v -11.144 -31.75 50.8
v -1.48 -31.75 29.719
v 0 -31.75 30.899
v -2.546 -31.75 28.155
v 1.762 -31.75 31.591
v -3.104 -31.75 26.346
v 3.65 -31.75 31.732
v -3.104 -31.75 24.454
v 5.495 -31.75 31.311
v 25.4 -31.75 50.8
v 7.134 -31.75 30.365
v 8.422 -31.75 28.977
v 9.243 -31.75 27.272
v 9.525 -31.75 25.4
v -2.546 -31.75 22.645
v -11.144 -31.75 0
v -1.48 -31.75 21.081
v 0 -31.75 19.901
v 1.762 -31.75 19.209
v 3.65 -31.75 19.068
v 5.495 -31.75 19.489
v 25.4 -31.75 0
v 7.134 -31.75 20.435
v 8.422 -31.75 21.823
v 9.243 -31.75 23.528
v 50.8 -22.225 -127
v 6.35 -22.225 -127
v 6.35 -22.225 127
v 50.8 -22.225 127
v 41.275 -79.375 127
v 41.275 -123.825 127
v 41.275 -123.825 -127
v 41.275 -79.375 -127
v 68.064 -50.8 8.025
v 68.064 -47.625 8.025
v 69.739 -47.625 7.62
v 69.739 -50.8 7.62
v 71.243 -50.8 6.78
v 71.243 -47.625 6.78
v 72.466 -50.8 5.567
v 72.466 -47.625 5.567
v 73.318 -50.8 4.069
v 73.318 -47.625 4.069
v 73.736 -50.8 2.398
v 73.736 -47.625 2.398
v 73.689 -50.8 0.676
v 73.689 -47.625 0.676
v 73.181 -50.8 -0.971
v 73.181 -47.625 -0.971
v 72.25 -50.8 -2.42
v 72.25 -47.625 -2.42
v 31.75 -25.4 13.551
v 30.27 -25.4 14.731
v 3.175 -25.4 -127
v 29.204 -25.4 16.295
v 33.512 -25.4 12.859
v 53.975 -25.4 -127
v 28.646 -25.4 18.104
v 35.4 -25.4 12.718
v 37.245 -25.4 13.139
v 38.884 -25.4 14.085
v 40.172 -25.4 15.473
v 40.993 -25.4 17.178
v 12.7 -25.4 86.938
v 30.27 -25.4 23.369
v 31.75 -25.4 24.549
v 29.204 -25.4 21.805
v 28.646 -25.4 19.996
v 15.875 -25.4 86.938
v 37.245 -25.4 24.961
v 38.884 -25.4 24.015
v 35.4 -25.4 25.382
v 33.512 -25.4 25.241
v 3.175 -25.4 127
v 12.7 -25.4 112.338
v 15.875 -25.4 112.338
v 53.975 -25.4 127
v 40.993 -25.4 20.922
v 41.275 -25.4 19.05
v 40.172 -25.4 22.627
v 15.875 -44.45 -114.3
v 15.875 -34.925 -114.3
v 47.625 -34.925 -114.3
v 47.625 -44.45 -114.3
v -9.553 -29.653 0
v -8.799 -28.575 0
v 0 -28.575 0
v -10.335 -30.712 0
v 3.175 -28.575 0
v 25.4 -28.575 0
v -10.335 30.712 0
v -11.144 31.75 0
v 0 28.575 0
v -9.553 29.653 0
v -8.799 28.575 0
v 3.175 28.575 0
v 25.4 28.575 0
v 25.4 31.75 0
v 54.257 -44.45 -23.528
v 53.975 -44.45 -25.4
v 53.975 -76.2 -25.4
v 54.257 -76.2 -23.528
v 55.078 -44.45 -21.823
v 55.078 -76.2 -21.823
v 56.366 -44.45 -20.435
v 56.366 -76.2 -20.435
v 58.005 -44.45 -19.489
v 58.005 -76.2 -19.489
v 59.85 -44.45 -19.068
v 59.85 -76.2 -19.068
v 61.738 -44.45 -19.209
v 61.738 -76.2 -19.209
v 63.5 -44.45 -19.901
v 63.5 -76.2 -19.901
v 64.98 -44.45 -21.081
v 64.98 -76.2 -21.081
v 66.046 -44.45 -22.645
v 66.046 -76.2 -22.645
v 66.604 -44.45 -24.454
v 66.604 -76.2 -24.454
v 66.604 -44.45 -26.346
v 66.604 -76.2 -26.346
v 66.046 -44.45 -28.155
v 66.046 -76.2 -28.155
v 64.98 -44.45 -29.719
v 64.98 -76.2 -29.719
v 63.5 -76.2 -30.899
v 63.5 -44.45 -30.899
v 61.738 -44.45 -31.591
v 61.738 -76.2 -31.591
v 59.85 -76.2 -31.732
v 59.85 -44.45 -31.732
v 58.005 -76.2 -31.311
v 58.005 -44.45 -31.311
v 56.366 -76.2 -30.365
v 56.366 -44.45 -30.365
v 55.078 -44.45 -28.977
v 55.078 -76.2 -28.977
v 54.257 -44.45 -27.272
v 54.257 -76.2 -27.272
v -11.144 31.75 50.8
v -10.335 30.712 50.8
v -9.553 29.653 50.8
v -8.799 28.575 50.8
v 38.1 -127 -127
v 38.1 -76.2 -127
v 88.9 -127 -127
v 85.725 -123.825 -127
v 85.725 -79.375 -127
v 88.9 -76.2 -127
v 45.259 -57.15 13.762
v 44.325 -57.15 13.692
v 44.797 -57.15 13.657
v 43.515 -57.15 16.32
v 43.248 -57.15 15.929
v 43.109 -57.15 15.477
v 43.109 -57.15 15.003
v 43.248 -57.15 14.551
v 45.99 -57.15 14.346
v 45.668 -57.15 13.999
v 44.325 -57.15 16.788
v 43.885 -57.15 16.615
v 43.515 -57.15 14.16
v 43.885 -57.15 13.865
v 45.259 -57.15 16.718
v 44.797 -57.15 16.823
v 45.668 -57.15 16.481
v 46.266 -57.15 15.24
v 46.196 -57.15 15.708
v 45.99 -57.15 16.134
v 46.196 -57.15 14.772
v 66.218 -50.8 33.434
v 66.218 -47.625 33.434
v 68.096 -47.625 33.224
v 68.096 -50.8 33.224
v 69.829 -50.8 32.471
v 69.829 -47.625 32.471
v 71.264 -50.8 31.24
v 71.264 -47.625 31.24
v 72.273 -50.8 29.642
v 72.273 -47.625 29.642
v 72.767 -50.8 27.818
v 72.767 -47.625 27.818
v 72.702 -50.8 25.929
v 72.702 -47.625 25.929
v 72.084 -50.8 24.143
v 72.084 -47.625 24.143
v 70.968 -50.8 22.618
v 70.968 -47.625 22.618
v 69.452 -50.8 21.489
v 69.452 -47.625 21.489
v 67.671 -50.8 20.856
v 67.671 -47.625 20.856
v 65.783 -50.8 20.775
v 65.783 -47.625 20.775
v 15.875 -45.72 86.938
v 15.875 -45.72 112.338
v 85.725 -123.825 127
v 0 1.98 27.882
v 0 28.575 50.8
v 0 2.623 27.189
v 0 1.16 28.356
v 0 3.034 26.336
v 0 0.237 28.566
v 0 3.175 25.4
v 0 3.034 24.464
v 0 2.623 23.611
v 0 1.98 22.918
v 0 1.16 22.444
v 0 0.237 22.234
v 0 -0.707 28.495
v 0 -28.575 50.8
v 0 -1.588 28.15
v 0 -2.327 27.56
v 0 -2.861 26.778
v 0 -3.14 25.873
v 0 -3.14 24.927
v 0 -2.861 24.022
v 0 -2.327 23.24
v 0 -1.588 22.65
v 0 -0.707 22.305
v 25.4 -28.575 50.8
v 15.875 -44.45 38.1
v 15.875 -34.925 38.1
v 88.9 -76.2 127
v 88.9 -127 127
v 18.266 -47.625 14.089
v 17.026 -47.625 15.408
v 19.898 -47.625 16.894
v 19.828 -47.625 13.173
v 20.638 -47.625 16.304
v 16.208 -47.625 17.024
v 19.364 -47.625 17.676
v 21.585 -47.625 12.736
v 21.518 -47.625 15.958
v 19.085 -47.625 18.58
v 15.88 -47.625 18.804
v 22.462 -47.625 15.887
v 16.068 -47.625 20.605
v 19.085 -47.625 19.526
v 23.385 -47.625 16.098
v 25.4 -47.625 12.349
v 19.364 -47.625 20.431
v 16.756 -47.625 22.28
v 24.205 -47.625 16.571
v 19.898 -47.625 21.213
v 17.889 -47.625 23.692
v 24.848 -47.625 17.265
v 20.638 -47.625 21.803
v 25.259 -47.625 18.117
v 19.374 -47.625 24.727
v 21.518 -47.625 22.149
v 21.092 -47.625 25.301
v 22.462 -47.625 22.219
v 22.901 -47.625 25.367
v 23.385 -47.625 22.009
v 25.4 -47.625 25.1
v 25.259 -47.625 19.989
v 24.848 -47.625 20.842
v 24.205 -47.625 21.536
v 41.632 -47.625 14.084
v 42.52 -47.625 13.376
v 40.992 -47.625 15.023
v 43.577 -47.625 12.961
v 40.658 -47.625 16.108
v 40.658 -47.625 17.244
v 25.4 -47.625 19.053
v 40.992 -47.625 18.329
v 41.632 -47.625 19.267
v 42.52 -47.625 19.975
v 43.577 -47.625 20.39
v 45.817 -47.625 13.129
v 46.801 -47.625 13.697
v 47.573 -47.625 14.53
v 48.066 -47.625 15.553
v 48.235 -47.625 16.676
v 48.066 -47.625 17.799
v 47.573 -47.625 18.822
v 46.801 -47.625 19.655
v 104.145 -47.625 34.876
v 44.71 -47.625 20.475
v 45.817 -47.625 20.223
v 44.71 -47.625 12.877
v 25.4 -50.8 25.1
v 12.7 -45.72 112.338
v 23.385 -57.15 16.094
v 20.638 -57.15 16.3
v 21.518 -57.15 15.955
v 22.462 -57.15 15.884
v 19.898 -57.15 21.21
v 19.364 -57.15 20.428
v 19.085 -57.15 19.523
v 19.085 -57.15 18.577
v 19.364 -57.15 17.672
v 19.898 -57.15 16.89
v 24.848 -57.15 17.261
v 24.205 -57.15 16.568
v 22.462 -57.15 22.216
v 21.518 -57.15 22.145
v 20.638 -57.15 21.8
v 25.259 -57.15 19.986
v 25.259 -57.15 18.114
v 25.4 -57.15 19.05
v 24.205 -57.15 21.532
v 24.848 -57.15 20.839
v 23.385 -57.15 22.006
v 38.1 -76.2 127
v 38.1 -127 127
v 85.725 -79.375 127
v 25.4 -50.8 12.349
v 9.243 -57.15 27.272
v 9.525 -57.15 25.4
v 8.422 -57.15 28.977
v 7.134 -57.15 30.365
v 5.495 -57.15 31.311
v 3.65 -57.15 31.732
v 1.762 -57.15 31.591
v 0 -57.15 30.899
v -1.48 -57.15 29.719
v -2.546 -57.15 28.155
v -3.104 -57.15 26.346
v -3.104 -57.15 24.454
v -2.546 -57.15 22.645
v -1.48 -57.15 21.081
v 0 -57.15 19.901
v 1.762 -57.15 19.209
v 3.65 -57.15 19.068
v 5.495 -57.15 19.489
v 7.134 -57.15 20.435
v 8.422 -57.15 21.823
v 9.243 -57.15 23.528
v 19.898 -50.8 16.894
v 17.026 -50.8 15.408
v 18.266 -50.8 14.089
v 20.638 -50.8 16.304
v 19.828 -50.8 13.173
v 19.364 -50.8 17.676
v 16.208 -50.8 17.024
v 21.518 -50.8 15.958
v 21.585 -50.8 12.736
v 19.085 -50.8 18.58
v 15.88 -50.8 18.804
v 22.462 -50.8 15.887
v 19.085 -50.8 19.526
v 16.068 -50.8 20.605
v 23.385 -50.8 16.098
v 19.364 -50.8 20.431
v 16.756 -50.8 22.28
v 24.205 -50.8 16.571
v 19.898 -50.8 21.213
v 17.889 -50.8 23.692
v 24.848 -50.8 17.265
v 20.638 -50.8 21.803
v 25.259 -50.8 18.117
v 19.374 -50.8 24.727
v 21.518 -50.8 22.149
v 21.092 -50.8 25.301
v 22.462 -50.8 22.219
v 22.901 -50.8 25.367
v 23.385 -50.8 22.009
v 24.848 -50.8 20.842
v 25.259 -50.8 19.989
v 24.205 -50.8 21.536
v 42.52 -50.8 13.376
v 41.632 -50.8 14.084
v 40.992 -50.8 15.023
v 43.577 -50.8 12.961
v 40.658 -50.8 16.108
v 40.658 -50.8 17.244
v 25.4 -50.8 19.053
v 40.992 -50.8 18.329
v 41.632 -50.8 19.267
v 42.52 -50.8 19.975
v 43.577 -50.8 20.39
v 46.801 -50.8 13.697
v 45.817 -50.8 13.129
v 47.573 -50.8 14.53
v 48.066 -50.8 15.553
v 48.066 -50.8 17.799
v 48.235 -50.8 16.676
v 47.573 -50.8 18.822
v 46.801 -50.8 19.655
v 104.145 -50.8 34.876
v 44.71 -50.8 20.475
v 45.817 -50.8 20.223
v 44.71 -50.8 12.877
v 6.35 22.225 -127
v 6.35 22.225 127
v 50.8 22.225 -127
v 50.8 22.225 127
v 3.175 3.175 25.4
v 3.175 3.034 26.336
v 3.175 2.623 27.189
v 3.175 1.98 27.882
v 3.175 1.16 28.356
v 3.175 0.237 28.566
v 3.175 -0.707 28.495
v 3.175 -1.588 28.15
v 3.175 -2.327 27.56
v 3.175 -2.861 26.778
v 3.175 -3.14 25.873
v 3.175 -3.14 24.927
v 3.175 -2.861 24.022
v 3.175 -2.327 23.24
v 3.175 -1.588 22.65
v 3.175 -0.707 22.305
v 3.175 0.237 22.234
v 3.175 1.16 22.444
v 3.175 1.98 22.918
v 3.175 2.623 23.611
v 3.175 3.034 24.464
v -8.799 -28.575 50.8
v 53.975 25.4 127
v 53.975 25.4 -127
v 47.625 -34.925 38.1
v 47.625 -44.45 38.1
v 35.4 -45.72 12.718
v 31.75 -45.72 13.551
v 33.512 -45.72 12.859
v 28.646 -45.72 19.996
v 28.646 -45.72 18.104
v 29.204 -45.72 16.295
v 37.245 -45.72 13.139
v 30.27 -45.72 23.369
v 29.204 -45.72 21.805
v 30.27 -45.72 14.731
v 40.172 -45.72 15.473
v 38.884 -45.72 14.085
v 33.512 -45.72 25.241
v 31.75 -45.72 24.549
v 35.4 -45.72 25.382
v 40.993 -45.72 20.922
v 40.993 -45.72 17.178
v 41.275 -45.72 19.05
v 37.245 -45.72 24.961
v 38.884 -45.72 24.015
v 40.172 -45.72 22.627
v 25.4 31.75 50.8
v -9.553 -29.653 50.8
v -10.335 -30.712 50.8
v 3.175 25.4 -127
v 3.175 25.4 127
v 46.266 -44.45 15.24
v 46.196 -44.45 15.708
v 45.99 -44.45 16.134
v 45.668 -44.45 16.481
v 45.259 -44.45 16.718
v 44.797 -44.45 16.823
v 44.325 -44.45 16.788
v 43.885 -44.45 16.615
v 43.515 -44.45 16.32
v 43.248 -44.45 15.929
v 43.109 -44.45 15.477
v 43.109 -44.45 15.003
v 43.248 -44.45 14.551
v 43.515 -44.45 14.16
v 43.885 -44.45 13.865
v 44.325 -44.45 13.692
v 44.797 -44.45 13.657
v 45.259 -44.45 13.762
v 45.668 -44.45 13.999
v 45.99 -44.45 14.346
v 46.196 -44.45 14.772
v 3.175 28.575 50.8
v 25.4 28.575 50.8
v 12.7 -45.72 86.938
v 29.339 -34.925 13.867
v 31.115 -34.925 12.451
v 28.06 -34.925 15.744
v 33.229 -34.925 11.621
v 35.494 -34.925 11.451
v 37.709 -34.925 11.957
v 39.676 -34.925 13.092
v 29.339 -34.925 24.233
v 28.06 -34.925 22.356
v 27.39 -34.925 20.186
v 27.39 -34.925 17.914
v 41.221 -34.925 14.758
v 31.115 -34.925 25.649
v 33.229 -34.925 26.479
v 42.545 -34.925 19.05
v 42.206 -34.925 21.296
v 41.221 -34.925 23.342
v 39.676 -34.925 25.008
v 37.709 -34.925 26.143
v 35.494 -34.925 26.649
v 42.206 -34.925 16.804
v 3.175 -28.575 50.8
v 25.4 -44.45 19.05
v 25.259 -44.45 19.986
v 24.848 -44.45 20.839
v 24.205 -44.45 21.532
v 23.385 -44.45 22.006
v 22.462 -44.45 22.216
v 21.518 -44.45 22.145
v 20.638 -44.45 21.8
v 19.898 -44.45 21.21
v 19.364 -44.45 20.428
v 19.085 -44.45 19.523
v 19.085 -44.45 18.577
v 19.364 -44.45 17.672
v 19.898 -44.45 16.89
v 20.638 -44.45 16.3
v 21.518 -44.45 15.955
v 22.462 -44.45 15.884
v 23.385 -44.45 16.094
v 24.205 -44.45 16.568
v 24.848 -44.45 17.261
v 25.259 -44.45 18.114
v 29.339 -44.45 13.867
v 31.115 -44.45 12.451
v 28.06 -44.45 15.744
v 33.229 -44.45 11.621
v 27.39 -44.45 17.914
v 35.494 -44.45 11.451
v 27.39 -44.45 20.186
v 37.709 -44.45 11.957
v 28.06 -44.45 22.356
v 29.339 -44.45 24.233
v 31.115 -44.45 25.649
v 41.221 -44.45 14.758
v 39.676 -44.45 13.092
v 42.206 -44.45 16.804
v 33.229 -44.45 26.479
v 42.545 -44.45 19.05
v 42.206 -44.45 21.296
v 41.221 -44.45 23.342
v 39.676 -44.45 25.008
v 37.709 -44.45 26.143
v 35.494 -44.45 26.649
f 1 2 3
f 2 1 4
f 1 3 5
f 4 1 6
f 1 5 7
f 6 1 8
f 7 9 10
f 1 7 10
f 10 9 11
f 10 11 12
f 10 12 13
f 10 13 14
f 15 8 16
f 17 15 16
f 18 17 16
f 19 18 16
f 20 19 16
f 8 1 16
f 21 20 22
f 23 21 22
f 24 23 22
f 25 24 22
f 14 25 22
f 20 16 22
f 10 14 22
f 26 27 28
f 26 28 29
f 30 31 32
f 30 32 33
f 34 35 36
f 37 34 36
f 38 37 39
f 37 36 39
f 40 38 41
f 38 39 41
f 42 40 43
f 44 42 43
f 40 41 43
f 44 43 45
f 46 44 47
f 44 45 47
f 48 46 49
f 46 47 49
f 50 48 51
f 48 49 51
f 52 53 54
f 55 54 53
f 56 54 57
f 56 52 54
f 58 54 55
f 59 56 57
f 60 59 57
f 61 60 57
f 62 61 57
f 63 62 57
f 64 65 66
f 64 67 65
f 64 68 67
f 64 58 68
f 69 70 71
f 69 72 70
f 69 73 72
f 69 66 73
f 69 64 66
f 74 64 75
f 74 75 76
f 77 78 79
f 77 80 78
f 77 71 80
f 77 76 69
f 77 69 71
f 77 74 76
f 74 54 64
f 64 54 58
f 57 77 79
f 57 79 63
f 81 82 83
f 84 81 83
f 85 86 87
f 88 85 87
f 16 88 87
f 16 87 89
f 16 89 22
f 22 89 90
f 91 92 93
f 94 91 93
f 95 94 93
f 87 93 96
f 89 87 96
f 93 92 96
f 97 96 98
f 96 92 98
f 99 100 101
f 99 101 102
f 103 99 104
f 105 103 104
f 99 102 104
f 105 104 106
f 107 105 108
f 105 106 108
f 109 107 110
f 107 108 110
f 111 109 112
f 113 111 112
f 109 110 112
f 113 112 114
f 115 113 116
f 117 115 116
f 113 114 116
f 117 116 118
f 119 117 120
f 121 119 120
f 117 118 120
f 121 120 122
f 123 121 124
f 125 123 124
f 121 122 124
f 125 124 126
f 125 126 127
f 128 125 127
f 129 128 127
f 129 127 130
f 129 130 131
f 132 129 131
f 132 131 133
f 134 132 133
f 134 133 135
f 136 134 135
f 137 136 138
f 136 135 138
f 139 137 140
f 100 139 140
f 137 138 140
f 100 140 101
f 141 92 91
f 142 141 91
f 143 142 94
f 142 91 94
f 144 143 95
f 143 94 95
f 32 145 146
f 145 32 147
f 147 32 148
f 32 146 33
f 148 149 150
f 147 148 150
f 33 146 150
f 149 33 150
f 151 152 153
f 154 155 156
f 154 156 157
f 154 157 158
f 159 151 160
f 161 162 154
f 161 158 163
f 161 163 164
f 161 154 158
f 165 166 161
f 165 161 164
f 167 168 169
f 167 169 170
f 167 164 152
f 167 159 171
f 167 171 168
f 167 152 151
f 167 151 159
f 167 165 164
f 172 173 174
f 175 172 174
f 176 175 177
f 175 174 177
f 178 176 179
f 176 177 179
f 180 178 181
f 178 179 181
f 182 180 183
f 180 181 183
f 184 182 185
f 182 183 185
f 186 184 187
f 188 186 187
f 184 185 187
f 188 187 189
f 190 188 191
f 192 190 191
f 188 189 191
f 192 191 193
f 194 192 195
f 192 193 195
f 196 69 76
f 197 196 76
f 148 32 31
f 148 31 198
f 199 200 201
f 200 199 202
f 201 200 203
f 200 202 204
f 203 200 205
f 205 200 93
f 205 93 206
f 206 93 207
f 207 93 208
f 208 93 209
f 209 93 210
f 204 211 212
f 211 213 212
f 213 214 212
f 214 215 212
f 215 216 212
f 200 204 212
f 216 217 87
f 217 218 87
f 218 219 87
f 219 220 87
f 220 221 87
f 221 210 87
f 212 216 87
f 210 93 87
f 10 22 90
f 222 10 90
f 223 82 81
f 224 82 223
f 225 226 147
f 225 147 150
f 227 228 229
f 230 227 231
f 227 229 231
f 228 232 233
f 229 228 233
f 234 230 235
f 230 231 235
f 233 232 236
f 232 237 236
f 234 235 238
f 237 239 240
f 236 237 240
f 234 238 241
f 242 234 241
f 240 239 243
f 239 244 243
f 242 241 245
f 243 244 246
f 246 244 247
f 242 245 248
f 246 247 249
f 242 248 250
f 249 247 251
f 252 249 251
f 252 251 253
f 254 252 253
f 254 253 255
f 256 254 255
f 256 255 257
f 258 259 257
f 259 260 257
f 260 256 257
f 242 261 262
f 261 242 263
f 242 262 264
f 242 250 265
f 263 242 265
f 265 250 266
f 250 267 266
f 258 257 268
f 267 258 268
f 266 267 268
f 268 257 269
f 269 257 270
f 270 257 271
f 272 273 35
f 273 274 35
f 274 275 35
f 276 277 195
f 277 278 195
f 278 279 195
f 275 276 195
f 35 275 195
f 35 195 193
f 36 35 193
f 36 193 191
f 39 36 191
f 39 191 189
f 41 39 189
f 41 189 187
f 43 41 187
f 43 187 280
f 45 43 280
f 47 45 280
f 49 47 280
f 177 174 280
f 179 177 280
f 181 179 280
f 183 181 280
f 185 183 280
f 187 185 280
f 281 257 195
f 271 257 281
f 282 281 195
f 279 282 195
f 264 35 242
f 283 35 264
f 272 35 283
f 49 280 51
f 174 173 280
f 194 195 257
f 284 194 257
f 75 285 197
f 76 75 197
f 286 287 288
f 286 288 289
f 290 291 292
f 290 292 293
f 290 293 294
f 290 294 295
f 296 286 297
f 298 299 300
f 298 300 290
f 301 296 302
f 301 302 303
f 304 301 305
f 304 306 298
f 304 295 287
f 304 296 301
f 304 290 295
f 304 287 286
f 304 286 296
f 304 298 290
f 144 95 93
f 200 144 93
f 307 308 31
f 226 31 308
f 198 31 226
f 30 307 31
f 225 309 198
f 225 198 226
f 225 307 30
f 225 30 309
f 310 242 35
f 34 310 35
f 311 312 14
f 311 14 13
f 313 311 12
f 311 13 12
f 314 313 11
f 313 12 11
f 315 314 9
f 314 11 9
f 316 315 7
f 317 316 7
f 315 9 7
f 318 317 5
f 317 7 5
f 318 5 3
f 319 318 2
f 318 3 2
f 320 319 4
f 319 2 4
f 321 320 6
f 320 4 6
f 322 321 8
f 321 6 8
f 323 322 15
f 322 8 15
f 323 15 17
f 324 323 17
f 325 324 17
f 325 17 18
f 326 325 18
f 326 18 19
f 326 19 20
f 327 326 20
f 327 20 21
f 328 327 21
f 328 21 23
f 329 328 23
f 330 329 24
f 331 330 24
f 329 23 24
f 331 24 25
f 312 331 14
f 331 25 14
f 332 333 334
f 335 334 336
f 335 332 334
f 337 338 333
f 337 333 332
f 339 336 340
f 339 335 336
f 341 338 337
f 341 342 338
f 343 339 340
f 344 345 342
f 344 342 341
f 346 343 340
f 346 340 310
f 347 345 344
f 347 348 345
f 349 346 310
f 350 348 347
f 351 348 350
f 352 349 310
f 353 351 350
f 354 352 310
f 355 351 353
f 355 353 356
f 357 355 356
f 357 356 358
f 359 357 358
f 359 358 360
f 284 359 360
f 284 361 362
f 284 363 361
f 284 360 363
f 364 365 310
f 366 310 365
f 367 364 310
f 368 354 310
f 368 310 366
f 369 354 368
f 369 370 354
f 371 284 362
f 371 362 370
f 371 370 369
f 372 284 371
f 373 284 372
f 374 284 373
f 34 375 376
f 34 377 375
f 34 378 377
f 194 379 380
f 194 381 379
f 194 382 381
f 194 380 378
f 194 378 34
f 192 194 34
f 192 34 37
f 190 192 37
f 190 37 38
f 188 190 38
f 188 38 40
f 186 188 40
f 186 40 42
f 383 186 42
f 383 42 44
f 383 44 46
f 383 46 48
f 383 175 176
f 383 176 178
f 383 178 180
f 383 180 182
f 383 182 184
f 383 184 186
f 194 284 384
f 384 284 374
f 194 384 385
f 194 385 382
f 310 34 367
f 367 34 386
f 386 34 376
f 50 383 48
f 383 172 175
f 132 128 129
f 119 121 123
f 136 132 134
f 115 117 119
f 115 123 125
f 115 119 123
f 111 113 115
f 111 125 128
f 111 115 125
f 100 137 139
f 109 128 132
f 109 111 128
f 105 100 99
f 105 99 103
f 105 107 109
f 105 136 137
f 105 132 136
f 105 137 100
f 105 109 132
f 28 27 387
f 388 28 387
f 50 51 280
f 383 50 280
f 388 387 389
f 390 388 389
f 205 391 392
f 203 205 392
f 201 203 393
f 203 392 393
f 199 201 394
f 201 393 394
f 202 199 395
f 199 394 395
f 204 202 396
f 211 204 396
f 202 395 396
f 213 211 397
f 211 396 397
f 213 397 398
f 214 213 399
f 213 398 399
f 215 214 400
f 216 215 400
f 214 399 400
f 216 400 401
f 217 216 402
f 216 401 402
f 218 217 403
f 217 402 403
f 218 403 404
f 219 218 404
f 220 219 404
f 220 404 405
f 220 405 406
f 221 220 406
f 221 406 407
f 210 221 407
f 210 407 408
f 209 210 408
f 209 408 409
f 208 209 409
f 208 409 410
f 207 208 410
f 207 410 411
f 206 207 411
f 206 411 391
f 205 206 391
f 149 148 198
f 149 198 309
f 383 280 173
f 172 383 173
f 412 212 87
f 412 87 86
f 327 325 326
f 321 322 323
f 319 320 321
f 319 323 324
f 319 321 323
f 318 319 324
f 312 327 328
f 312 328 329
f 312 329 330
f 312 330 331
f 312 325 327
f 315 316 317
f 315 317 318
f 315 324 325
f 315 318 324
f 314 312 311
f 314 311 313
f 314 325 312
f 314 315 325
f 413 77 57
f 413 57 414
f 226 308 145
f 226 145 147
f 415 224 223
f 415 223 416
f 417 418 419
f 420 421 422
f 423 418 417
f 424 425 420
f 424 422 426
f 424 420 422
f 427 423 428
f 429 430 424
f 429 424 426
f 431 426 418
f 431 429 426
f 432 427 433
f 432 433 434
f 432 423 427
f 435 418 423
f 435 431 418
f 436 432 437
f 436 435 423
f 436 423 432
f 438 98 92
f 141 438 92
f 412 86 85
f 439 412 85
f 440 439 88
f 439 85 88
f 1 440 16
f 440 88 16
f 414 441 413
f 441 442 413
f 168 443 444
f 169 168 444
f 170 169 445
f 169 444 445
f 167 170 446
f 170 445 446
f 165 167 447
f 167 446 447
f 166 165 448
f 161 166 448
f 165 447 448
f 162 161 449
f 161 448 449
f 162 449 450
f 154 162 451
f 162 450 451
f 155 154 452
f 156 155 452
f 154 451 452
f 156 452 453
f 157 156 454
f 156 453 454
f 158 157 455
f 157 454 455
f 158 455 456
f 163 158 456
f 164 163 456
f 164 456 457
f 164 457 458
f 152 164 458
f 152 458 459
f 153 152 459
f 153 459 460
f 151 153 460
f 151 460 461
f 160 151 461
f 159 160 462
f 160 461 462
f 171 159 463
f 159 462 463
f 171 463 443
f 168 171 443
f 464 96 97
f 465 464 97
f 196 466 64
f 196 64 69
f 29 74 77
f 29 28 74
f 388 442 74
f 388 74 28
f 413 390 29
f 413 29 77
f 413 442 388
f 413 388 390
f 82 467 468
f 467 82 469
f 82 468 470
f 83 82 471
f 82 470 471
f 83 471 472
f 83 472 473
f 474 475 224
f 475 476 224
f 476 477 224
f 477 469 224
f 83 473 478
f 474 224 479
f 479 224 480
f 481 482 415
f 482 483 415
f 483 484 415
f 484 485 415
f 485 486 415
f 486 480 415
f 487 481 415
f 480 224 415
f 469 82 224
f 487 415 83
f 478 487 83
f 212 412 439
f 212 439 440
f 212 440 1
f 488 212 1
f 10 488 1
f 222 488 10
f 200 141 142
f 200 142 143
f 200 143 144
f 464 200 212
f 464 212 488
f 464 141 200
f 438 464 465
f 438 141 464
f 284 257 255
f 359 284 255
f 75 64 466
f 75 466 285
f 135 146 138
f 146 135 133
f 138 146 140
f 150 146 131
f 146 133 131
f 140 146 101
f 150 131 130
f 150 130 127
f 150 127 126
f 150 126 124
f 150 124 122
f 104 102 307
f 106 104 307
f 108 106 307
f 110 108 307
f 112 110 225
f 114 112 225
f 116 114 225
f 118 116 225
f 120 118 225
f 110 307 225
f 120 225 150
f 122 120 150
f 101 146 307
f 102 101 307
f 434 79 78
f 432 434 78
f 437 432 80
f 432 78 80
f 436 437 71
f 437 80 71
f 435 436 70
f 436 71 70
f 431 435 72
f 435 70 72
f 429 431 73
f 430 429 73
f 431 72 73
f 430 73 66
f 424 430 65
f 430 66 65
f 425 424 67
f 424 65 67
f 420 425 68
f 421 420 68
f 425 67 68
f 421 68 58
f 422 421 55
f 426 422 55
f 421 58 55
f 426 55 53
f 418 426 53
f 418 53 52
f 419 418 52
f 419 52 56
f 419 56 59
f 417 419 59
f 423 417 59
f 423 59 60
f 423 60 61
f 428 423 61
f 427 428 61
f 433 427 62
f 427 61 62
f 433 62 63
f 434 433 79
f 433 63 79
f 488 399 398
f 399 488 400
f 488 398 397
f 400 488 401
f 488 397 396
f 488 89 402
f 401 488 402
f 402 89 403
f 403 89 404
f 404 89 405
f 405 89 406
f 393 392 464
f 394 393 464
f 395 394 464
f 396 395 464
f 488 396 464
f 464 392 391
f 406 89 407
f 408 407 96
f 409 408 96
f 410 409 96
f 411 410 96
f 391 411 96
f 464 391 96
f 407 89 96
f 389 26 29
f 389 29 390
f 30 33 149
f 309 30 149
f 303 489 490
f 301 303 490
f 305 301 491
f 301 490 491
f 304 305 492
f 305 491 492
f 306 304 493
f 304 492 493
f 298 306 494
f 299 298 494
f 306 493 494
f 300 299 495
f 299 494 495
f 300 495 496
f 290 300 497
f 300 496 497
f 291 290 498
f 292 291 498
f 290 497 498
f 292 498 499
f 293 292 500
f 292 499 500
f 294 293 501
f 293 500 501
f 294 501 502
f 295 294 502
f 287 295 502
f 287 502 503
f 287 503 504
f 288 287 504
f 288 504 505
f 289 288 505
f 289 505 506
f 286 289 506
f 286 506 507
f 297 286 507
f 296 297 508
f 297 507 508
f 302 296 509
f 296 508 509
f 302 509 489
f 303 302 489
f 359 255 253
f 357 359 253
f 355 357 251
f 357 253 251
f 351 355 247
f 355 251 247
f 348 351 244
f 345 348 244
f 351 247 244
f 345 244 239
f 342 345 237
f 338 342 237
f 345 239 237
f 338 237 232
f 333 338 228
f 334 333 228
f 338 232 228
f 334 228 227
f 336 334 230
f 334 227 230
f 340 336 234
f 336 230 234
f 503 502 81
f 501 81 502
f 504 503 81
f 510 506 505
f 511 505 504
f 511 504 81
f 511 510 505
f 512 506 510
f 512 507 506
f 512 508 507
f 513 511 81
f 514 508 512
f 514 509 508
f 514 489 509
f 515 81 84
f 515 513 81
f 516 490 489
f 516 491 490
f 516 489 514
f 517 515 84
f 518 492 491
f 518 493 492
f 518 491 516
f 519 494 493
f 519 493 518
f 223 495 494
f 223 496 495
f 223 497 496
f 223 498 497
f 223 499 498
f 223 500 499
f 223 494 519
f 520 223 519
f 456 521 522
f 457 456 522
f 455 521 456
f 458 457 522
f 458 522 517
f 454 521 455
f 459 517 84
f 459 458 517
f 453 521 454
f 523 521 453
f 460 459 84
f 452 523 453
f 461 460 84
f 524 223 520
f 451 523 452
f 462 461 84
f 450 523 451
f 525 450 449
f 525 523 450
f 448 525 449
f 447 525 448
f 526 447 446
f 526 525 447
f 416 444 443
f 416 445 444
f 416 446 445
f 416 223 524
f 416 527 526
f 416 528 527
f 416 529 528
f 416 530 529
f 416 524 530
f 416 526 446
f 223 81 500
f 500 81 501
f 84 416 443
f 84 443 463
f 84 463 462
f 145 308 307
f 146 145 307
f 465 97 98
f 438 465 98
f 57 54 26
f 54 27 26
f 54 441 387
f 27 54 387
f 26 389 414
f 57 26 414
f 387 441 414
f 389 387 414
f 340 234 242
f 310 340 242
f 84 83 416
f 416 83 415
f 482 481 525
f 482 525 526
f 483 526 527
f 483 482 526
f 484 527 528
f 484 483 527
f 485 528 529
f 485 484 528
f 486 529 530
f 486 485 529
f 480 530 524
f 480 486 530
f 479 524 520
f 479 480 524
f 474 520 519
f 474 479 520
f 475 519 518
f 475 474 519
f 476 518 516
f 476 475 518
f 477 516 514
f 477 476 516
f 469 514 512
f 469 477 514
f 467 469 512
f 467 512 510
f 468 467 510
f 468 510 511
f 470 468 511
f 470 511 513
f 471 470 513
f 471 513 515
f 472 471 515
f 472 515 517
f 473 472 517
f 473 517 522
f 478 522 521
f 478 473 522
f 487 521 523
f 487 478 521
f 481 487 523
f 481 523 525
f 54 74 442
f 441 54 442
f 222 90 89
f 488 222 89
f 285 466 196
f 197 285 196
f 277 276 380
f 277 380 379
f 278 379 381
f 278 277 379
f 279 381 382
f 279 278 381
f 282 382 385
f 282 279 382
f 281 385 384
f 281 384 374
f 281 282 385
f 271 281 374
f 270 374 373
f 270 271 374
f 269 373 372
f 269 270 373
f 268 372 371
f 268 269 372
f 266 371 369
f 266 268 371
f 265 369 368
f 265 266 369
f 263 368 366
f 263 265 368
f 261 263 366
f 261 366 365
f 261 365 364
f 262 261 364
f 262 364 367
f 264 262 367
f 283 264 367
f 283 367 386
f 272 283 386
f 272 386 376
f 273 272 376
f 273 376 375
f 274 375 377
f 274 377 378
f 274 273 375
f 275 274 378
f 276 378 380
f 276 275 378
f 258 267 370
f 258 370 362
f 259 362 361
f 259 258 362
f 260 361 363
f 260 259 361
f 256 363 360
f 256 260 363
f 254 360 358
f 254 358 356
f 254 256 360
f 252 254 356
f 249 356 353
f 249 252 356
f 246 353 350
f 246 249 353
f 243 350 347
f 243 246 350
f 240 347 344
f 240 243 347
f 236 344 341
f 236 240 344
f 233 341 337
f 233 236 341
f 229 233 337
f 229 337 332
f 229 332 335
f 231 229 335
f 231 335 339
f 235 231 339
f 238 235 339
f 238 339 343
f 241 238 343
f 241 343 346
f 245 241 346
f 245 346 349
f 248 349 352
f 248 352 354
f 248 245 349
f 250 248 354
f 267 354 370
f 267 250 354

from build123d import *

# Parameters (mm, degrees)
F1_DEPTH  = 50.8
F2_R      = 3.175
F3_DEPTH  = 14.3202627102
F4_W      = 50.8
F4_H      = 50.8
F4_W_2    = 44.45
F4_H_2    = 44.45
F5_DEPTH  = 127
F6_R      = 6.35
F7_DEPTH  = 25.4
F8_R      = 6.35
F8_W      = 3.175
F8_H      = 25.4
F9_DEPTH  = 20.32
F11_START = 15.875
F10_R     = 3.81
F10_R_2   = 3.175
F11_DEPTH = 3.175
F12_START = 9.525
F8_W_2    = 31.75
F8_H_2    = 152.4
F8_R_2    = 7.62
F12_DEPTH = 9.525
F13_R     = 3.175
F13_R_2   = 1.5875
F14_DEPTH = 12.7
F15_R     = 6.35
F16_DEPTH = 31.75


# Not quite as in the source:
# - a feature names something its author has since deleted; it is built from what else it names


with BuildPart() as f1:
    # F0 (on Top) → F1 (new body)
    with BuildSketch(Plane.XY):
        with BuildLine():
            Line((0, 28.575), (0, 31.75))
            Line((0, 31.75), (-11.1442627102, 31.75))
            ThreePointArc((-11.1442627102, 31.75), (-9.940629285, 30.1852915304), (-8.7986979368, 28.575))
            Line((-8.7986979368, 28.575), (0, 28.575))
        make_face()
        Polygon((25.4, 28.575), (25.4, 31.75), (0, 31.75), (0, 28.575), (0, -28.575), (0, -31.75), (25.4, -31.75), (25.4, -28.575), (3.175, -28.575), (3.175, 28.575), align=None)
        with BuildLine():
            Line((0, -31.75), (0, -28.575))
            Line((0, -28.575), (-8.7986979368, -28.575))
            ThreePointArc((-8.7986979368, -28.575), (-9.940629285, -30.1852915304), (-11.1442627102, -31.75))
            Line((-11.1442627102, -31.75), (0, -31.75))
        make_face()
    extrude(amount=F1_DEPTH)

    # F2 (on face) → F3 (cut, through all)
    with BuildSketch(Plane.YZ.offset(3.175)):
        with Locations((0, 25.4)):
            Circle(F2_R)
    extrude(amount=-F3_DEPTH, mode=Mode.SUBTRACT)

    # F6 (on face) → F7 (join)
    with BuildSketch(Plane.XZ.offset(31.75)):
        with Locations((3.175, 25.4)):
            Circle(F6_R)
    extrude(amount=F7_DEPTH)


with BuildPart() as f5:
    # F4 (on Top) → F5 (new body, symmetric)
    with BuildSketch(Plane.XY):
        with Locations((28.575, 0)):
            Rectangle(F4_W, F4_H)
        with Locations((28.575, 0)):
            Rectangle(F4_W_2, F4_H_2, mode=Mode.SUBTRACT)
    extrude(amount=F5_DEPTH, both=True)

    # F8 (on face) → F9 (join)
    with BuildSketch(Plane.XZ.offset(25.4)):
        with Locations((34.925, 19.05)):
            Circle(F8_R)
        with Locations((14.2875, 99.6379471987)):
            Rectangle(F8_W, F8_H)
    extrude(amount=F9_DEPTH)


with BuildPart() as f5b:
    # F4 (on Top) → F5, piece 2 (new body, symmetric)
    with BuildSketch(Plane.XY):
        with Locations((63.5, -101.6)):
            Rectangle(F4_W, F4_H)
        with Locations((63.5, -101.6)):
            Rectangle(F4_W_2, F4_H_2, mode=Mode.SUBTRACT)
    extrude(amount=F5_DEPTH, both=True)

    # F15 (on face) → F16 (join)
    with BuildSketch(Plane(origin=(0, -76.2, 0), x_dir=(-1, 0, 0), z_dir=(0, 1, 0))):
        with Locations((-60.325, -25.4)):
            Circle(F15_R)
    extrude(amount=F16_DEPTH)


with BuildPart() as f11:
    # F10 (on face) → F11 (new body)
    with BuildSketch(Plane.XZ.offset(31.75).offset(F11_START)):
        with BuildLine():
            ThreePointArc((28.5750004077, 19.0532180694), (27.724261604, 15.8782178656), (25.4, 13.55395652))
            Line((25.4, 13.55395652), (25.4, 12.3489060883))
            Line((25.4, 12.3489060883), (68.0639762232, 8.0249561852))
            ThreePointArc((68.0639762232, 8.0249561852), (73.3180108307, 4.0694128265), (72.2496087167, -2.4197874203))
            Line((72.2496087167, -2.4197874203), (104.1447286146, 34.8758902287))
            Line((104.1447286146, 34.8758902287), (66.2178465005, 33.4344126184))
            ThreePointArc((66.2178465005, 33.4344126184), (72.8052703736, 26.8709436265), (65.7828861663, 20.7750926985))
            Line((65.7828861663, 20.7750926985), (25.4, 25.0995258416))
            Line((25.4, 25.0995258416), (25.4, 24.5524796189))
            ThreePointArc((25.4, 24.5524796189), (27.724261604, 22.2282182733), (28.5750004077, 19.0532180694))
        make_face()
        with Locations((44.4250904951, 16.6759039528)):
            Circle(F10_R, mode=Mode.SUBTRACT)
        with BuildLine():
            Line((25.4, 13.55395652), (25.4, 19.0532180694))
            Line((25.4, 19.0532180694), (25.4, 24.5524796189))
            ThreePointArc((25.4, 24.5524796189), (24.1931740543, 25.0905016057), (22.9011294955, 25.367119356))
            ThreePointArc((22.9011294955, 25.367119356), (15.9092059707, 19.7114282405), (21.5847144531, 12.7355813359))
            ThreePointArc((21.5847144531, 12.7355813359), (23.556776587, 12.8444442607), (25.4, 13.55395652))
        make_face()
        with Locations((22.2250004077, 19.0532180694)):
            Circle(F10_R_2, mode=Mode.SUBTRACT)
        with BuildLine():
            Line((25.4, 24.5524796189), (25.4, 19.0532180694))
            Line((25.4, 19.0532180694), (25.4, 13.55395652))
            ThreePointArc((25.4, 13.55395652), (27.724261604, 15.8782178656), (28.5750004077, 19.0532180694))
            ThreePointArc((28.5750004077, 19.0532180694), (27.724261604, 22.2282182733), (25.4, 24.5524796189))
        make_face()
        with BuildLine():
            Line((25.4, 13.55395652), (25.4, 19.0532180694))
            Line((25.4, 19.0532180694), (25.4, 24.5524796189))
            ThreePointArc((25.4, 24.5524796189), (24.1931740543, 25.0905016057), (22.9011294955, 25.367119356))
            ThreePointArc((22.9011294955, 25.367119356), (15.9092059707, 19.7114282405), (21.5847144531, 12.7355813359))
            ThreePointArc((21.5847144531, 12.7355813359), (23.556776587, 12.8444442607), (25.4, 13.55395652))
        make_face()
        with Locations((22.2250004077, 19.0532180694)):
            Circle(F10_R_2, mode=Mode.SUBTRACT)
        with BuildLine():
            ThreePointArc((22.9011294955, 25.367119356), (24.1931740543, 25.0905016057), (25.4, 24.5524796189))
            Line((25.4, 24.5524796189), (25.4, 25.0995258416))
            Line((25.4, 25.0995258416), (22.9011294955, 25.367119356))
        make_face()
        with BuildLine():
            Line((25.4, 12.3489060883), (25.4, 13.55395652))
            ThreePointArc((25.4, 13.55395652), (23.556776587, 12.8444442607), (21.5847144531, 12.7355813359))
            Line((21.5847144531, 12.7355813359), (25.4, 12.3489060883))
        make_face()
    extrude(amount=F11_DEPTH)


with BuildPart() as f12:
    # F8 (on face) → F12 (new body)
    with BuildSketch(Plane.XZ.offset(25.4).offset(F12_START)):
        with Locations((31.75, -38.1)):
            Rectangle(F8_W_2, F8_H_2)
        with Locations((34.925, 19.05)):
            Circle(F8_R_2, mode=Mode.SUBTRACT)
        with Locations((31.75, -38.1)):
            Rectangle(F8_W_2, F8_H_2)
        with Locations((34.925, 19.05)):
            Circle(F8_R_2, mode=Mode.SUBTRACT)
    extrude(amount=F12_DEPTH)

    # F13 (on face) → F14 (join)
    with BuildSketch(Plane.XZ.offset(44.45)):
        with Locations((22.225, 19.05)):
            Circle(F13_R)
        with Locations((44.6786, 15.24)):
            Circle(F13_R_2)
    extrude(amount=F14_DEPTH)


solid = Compound([f1.part, f5.part, f5b.part, f11.part, f12.part])
